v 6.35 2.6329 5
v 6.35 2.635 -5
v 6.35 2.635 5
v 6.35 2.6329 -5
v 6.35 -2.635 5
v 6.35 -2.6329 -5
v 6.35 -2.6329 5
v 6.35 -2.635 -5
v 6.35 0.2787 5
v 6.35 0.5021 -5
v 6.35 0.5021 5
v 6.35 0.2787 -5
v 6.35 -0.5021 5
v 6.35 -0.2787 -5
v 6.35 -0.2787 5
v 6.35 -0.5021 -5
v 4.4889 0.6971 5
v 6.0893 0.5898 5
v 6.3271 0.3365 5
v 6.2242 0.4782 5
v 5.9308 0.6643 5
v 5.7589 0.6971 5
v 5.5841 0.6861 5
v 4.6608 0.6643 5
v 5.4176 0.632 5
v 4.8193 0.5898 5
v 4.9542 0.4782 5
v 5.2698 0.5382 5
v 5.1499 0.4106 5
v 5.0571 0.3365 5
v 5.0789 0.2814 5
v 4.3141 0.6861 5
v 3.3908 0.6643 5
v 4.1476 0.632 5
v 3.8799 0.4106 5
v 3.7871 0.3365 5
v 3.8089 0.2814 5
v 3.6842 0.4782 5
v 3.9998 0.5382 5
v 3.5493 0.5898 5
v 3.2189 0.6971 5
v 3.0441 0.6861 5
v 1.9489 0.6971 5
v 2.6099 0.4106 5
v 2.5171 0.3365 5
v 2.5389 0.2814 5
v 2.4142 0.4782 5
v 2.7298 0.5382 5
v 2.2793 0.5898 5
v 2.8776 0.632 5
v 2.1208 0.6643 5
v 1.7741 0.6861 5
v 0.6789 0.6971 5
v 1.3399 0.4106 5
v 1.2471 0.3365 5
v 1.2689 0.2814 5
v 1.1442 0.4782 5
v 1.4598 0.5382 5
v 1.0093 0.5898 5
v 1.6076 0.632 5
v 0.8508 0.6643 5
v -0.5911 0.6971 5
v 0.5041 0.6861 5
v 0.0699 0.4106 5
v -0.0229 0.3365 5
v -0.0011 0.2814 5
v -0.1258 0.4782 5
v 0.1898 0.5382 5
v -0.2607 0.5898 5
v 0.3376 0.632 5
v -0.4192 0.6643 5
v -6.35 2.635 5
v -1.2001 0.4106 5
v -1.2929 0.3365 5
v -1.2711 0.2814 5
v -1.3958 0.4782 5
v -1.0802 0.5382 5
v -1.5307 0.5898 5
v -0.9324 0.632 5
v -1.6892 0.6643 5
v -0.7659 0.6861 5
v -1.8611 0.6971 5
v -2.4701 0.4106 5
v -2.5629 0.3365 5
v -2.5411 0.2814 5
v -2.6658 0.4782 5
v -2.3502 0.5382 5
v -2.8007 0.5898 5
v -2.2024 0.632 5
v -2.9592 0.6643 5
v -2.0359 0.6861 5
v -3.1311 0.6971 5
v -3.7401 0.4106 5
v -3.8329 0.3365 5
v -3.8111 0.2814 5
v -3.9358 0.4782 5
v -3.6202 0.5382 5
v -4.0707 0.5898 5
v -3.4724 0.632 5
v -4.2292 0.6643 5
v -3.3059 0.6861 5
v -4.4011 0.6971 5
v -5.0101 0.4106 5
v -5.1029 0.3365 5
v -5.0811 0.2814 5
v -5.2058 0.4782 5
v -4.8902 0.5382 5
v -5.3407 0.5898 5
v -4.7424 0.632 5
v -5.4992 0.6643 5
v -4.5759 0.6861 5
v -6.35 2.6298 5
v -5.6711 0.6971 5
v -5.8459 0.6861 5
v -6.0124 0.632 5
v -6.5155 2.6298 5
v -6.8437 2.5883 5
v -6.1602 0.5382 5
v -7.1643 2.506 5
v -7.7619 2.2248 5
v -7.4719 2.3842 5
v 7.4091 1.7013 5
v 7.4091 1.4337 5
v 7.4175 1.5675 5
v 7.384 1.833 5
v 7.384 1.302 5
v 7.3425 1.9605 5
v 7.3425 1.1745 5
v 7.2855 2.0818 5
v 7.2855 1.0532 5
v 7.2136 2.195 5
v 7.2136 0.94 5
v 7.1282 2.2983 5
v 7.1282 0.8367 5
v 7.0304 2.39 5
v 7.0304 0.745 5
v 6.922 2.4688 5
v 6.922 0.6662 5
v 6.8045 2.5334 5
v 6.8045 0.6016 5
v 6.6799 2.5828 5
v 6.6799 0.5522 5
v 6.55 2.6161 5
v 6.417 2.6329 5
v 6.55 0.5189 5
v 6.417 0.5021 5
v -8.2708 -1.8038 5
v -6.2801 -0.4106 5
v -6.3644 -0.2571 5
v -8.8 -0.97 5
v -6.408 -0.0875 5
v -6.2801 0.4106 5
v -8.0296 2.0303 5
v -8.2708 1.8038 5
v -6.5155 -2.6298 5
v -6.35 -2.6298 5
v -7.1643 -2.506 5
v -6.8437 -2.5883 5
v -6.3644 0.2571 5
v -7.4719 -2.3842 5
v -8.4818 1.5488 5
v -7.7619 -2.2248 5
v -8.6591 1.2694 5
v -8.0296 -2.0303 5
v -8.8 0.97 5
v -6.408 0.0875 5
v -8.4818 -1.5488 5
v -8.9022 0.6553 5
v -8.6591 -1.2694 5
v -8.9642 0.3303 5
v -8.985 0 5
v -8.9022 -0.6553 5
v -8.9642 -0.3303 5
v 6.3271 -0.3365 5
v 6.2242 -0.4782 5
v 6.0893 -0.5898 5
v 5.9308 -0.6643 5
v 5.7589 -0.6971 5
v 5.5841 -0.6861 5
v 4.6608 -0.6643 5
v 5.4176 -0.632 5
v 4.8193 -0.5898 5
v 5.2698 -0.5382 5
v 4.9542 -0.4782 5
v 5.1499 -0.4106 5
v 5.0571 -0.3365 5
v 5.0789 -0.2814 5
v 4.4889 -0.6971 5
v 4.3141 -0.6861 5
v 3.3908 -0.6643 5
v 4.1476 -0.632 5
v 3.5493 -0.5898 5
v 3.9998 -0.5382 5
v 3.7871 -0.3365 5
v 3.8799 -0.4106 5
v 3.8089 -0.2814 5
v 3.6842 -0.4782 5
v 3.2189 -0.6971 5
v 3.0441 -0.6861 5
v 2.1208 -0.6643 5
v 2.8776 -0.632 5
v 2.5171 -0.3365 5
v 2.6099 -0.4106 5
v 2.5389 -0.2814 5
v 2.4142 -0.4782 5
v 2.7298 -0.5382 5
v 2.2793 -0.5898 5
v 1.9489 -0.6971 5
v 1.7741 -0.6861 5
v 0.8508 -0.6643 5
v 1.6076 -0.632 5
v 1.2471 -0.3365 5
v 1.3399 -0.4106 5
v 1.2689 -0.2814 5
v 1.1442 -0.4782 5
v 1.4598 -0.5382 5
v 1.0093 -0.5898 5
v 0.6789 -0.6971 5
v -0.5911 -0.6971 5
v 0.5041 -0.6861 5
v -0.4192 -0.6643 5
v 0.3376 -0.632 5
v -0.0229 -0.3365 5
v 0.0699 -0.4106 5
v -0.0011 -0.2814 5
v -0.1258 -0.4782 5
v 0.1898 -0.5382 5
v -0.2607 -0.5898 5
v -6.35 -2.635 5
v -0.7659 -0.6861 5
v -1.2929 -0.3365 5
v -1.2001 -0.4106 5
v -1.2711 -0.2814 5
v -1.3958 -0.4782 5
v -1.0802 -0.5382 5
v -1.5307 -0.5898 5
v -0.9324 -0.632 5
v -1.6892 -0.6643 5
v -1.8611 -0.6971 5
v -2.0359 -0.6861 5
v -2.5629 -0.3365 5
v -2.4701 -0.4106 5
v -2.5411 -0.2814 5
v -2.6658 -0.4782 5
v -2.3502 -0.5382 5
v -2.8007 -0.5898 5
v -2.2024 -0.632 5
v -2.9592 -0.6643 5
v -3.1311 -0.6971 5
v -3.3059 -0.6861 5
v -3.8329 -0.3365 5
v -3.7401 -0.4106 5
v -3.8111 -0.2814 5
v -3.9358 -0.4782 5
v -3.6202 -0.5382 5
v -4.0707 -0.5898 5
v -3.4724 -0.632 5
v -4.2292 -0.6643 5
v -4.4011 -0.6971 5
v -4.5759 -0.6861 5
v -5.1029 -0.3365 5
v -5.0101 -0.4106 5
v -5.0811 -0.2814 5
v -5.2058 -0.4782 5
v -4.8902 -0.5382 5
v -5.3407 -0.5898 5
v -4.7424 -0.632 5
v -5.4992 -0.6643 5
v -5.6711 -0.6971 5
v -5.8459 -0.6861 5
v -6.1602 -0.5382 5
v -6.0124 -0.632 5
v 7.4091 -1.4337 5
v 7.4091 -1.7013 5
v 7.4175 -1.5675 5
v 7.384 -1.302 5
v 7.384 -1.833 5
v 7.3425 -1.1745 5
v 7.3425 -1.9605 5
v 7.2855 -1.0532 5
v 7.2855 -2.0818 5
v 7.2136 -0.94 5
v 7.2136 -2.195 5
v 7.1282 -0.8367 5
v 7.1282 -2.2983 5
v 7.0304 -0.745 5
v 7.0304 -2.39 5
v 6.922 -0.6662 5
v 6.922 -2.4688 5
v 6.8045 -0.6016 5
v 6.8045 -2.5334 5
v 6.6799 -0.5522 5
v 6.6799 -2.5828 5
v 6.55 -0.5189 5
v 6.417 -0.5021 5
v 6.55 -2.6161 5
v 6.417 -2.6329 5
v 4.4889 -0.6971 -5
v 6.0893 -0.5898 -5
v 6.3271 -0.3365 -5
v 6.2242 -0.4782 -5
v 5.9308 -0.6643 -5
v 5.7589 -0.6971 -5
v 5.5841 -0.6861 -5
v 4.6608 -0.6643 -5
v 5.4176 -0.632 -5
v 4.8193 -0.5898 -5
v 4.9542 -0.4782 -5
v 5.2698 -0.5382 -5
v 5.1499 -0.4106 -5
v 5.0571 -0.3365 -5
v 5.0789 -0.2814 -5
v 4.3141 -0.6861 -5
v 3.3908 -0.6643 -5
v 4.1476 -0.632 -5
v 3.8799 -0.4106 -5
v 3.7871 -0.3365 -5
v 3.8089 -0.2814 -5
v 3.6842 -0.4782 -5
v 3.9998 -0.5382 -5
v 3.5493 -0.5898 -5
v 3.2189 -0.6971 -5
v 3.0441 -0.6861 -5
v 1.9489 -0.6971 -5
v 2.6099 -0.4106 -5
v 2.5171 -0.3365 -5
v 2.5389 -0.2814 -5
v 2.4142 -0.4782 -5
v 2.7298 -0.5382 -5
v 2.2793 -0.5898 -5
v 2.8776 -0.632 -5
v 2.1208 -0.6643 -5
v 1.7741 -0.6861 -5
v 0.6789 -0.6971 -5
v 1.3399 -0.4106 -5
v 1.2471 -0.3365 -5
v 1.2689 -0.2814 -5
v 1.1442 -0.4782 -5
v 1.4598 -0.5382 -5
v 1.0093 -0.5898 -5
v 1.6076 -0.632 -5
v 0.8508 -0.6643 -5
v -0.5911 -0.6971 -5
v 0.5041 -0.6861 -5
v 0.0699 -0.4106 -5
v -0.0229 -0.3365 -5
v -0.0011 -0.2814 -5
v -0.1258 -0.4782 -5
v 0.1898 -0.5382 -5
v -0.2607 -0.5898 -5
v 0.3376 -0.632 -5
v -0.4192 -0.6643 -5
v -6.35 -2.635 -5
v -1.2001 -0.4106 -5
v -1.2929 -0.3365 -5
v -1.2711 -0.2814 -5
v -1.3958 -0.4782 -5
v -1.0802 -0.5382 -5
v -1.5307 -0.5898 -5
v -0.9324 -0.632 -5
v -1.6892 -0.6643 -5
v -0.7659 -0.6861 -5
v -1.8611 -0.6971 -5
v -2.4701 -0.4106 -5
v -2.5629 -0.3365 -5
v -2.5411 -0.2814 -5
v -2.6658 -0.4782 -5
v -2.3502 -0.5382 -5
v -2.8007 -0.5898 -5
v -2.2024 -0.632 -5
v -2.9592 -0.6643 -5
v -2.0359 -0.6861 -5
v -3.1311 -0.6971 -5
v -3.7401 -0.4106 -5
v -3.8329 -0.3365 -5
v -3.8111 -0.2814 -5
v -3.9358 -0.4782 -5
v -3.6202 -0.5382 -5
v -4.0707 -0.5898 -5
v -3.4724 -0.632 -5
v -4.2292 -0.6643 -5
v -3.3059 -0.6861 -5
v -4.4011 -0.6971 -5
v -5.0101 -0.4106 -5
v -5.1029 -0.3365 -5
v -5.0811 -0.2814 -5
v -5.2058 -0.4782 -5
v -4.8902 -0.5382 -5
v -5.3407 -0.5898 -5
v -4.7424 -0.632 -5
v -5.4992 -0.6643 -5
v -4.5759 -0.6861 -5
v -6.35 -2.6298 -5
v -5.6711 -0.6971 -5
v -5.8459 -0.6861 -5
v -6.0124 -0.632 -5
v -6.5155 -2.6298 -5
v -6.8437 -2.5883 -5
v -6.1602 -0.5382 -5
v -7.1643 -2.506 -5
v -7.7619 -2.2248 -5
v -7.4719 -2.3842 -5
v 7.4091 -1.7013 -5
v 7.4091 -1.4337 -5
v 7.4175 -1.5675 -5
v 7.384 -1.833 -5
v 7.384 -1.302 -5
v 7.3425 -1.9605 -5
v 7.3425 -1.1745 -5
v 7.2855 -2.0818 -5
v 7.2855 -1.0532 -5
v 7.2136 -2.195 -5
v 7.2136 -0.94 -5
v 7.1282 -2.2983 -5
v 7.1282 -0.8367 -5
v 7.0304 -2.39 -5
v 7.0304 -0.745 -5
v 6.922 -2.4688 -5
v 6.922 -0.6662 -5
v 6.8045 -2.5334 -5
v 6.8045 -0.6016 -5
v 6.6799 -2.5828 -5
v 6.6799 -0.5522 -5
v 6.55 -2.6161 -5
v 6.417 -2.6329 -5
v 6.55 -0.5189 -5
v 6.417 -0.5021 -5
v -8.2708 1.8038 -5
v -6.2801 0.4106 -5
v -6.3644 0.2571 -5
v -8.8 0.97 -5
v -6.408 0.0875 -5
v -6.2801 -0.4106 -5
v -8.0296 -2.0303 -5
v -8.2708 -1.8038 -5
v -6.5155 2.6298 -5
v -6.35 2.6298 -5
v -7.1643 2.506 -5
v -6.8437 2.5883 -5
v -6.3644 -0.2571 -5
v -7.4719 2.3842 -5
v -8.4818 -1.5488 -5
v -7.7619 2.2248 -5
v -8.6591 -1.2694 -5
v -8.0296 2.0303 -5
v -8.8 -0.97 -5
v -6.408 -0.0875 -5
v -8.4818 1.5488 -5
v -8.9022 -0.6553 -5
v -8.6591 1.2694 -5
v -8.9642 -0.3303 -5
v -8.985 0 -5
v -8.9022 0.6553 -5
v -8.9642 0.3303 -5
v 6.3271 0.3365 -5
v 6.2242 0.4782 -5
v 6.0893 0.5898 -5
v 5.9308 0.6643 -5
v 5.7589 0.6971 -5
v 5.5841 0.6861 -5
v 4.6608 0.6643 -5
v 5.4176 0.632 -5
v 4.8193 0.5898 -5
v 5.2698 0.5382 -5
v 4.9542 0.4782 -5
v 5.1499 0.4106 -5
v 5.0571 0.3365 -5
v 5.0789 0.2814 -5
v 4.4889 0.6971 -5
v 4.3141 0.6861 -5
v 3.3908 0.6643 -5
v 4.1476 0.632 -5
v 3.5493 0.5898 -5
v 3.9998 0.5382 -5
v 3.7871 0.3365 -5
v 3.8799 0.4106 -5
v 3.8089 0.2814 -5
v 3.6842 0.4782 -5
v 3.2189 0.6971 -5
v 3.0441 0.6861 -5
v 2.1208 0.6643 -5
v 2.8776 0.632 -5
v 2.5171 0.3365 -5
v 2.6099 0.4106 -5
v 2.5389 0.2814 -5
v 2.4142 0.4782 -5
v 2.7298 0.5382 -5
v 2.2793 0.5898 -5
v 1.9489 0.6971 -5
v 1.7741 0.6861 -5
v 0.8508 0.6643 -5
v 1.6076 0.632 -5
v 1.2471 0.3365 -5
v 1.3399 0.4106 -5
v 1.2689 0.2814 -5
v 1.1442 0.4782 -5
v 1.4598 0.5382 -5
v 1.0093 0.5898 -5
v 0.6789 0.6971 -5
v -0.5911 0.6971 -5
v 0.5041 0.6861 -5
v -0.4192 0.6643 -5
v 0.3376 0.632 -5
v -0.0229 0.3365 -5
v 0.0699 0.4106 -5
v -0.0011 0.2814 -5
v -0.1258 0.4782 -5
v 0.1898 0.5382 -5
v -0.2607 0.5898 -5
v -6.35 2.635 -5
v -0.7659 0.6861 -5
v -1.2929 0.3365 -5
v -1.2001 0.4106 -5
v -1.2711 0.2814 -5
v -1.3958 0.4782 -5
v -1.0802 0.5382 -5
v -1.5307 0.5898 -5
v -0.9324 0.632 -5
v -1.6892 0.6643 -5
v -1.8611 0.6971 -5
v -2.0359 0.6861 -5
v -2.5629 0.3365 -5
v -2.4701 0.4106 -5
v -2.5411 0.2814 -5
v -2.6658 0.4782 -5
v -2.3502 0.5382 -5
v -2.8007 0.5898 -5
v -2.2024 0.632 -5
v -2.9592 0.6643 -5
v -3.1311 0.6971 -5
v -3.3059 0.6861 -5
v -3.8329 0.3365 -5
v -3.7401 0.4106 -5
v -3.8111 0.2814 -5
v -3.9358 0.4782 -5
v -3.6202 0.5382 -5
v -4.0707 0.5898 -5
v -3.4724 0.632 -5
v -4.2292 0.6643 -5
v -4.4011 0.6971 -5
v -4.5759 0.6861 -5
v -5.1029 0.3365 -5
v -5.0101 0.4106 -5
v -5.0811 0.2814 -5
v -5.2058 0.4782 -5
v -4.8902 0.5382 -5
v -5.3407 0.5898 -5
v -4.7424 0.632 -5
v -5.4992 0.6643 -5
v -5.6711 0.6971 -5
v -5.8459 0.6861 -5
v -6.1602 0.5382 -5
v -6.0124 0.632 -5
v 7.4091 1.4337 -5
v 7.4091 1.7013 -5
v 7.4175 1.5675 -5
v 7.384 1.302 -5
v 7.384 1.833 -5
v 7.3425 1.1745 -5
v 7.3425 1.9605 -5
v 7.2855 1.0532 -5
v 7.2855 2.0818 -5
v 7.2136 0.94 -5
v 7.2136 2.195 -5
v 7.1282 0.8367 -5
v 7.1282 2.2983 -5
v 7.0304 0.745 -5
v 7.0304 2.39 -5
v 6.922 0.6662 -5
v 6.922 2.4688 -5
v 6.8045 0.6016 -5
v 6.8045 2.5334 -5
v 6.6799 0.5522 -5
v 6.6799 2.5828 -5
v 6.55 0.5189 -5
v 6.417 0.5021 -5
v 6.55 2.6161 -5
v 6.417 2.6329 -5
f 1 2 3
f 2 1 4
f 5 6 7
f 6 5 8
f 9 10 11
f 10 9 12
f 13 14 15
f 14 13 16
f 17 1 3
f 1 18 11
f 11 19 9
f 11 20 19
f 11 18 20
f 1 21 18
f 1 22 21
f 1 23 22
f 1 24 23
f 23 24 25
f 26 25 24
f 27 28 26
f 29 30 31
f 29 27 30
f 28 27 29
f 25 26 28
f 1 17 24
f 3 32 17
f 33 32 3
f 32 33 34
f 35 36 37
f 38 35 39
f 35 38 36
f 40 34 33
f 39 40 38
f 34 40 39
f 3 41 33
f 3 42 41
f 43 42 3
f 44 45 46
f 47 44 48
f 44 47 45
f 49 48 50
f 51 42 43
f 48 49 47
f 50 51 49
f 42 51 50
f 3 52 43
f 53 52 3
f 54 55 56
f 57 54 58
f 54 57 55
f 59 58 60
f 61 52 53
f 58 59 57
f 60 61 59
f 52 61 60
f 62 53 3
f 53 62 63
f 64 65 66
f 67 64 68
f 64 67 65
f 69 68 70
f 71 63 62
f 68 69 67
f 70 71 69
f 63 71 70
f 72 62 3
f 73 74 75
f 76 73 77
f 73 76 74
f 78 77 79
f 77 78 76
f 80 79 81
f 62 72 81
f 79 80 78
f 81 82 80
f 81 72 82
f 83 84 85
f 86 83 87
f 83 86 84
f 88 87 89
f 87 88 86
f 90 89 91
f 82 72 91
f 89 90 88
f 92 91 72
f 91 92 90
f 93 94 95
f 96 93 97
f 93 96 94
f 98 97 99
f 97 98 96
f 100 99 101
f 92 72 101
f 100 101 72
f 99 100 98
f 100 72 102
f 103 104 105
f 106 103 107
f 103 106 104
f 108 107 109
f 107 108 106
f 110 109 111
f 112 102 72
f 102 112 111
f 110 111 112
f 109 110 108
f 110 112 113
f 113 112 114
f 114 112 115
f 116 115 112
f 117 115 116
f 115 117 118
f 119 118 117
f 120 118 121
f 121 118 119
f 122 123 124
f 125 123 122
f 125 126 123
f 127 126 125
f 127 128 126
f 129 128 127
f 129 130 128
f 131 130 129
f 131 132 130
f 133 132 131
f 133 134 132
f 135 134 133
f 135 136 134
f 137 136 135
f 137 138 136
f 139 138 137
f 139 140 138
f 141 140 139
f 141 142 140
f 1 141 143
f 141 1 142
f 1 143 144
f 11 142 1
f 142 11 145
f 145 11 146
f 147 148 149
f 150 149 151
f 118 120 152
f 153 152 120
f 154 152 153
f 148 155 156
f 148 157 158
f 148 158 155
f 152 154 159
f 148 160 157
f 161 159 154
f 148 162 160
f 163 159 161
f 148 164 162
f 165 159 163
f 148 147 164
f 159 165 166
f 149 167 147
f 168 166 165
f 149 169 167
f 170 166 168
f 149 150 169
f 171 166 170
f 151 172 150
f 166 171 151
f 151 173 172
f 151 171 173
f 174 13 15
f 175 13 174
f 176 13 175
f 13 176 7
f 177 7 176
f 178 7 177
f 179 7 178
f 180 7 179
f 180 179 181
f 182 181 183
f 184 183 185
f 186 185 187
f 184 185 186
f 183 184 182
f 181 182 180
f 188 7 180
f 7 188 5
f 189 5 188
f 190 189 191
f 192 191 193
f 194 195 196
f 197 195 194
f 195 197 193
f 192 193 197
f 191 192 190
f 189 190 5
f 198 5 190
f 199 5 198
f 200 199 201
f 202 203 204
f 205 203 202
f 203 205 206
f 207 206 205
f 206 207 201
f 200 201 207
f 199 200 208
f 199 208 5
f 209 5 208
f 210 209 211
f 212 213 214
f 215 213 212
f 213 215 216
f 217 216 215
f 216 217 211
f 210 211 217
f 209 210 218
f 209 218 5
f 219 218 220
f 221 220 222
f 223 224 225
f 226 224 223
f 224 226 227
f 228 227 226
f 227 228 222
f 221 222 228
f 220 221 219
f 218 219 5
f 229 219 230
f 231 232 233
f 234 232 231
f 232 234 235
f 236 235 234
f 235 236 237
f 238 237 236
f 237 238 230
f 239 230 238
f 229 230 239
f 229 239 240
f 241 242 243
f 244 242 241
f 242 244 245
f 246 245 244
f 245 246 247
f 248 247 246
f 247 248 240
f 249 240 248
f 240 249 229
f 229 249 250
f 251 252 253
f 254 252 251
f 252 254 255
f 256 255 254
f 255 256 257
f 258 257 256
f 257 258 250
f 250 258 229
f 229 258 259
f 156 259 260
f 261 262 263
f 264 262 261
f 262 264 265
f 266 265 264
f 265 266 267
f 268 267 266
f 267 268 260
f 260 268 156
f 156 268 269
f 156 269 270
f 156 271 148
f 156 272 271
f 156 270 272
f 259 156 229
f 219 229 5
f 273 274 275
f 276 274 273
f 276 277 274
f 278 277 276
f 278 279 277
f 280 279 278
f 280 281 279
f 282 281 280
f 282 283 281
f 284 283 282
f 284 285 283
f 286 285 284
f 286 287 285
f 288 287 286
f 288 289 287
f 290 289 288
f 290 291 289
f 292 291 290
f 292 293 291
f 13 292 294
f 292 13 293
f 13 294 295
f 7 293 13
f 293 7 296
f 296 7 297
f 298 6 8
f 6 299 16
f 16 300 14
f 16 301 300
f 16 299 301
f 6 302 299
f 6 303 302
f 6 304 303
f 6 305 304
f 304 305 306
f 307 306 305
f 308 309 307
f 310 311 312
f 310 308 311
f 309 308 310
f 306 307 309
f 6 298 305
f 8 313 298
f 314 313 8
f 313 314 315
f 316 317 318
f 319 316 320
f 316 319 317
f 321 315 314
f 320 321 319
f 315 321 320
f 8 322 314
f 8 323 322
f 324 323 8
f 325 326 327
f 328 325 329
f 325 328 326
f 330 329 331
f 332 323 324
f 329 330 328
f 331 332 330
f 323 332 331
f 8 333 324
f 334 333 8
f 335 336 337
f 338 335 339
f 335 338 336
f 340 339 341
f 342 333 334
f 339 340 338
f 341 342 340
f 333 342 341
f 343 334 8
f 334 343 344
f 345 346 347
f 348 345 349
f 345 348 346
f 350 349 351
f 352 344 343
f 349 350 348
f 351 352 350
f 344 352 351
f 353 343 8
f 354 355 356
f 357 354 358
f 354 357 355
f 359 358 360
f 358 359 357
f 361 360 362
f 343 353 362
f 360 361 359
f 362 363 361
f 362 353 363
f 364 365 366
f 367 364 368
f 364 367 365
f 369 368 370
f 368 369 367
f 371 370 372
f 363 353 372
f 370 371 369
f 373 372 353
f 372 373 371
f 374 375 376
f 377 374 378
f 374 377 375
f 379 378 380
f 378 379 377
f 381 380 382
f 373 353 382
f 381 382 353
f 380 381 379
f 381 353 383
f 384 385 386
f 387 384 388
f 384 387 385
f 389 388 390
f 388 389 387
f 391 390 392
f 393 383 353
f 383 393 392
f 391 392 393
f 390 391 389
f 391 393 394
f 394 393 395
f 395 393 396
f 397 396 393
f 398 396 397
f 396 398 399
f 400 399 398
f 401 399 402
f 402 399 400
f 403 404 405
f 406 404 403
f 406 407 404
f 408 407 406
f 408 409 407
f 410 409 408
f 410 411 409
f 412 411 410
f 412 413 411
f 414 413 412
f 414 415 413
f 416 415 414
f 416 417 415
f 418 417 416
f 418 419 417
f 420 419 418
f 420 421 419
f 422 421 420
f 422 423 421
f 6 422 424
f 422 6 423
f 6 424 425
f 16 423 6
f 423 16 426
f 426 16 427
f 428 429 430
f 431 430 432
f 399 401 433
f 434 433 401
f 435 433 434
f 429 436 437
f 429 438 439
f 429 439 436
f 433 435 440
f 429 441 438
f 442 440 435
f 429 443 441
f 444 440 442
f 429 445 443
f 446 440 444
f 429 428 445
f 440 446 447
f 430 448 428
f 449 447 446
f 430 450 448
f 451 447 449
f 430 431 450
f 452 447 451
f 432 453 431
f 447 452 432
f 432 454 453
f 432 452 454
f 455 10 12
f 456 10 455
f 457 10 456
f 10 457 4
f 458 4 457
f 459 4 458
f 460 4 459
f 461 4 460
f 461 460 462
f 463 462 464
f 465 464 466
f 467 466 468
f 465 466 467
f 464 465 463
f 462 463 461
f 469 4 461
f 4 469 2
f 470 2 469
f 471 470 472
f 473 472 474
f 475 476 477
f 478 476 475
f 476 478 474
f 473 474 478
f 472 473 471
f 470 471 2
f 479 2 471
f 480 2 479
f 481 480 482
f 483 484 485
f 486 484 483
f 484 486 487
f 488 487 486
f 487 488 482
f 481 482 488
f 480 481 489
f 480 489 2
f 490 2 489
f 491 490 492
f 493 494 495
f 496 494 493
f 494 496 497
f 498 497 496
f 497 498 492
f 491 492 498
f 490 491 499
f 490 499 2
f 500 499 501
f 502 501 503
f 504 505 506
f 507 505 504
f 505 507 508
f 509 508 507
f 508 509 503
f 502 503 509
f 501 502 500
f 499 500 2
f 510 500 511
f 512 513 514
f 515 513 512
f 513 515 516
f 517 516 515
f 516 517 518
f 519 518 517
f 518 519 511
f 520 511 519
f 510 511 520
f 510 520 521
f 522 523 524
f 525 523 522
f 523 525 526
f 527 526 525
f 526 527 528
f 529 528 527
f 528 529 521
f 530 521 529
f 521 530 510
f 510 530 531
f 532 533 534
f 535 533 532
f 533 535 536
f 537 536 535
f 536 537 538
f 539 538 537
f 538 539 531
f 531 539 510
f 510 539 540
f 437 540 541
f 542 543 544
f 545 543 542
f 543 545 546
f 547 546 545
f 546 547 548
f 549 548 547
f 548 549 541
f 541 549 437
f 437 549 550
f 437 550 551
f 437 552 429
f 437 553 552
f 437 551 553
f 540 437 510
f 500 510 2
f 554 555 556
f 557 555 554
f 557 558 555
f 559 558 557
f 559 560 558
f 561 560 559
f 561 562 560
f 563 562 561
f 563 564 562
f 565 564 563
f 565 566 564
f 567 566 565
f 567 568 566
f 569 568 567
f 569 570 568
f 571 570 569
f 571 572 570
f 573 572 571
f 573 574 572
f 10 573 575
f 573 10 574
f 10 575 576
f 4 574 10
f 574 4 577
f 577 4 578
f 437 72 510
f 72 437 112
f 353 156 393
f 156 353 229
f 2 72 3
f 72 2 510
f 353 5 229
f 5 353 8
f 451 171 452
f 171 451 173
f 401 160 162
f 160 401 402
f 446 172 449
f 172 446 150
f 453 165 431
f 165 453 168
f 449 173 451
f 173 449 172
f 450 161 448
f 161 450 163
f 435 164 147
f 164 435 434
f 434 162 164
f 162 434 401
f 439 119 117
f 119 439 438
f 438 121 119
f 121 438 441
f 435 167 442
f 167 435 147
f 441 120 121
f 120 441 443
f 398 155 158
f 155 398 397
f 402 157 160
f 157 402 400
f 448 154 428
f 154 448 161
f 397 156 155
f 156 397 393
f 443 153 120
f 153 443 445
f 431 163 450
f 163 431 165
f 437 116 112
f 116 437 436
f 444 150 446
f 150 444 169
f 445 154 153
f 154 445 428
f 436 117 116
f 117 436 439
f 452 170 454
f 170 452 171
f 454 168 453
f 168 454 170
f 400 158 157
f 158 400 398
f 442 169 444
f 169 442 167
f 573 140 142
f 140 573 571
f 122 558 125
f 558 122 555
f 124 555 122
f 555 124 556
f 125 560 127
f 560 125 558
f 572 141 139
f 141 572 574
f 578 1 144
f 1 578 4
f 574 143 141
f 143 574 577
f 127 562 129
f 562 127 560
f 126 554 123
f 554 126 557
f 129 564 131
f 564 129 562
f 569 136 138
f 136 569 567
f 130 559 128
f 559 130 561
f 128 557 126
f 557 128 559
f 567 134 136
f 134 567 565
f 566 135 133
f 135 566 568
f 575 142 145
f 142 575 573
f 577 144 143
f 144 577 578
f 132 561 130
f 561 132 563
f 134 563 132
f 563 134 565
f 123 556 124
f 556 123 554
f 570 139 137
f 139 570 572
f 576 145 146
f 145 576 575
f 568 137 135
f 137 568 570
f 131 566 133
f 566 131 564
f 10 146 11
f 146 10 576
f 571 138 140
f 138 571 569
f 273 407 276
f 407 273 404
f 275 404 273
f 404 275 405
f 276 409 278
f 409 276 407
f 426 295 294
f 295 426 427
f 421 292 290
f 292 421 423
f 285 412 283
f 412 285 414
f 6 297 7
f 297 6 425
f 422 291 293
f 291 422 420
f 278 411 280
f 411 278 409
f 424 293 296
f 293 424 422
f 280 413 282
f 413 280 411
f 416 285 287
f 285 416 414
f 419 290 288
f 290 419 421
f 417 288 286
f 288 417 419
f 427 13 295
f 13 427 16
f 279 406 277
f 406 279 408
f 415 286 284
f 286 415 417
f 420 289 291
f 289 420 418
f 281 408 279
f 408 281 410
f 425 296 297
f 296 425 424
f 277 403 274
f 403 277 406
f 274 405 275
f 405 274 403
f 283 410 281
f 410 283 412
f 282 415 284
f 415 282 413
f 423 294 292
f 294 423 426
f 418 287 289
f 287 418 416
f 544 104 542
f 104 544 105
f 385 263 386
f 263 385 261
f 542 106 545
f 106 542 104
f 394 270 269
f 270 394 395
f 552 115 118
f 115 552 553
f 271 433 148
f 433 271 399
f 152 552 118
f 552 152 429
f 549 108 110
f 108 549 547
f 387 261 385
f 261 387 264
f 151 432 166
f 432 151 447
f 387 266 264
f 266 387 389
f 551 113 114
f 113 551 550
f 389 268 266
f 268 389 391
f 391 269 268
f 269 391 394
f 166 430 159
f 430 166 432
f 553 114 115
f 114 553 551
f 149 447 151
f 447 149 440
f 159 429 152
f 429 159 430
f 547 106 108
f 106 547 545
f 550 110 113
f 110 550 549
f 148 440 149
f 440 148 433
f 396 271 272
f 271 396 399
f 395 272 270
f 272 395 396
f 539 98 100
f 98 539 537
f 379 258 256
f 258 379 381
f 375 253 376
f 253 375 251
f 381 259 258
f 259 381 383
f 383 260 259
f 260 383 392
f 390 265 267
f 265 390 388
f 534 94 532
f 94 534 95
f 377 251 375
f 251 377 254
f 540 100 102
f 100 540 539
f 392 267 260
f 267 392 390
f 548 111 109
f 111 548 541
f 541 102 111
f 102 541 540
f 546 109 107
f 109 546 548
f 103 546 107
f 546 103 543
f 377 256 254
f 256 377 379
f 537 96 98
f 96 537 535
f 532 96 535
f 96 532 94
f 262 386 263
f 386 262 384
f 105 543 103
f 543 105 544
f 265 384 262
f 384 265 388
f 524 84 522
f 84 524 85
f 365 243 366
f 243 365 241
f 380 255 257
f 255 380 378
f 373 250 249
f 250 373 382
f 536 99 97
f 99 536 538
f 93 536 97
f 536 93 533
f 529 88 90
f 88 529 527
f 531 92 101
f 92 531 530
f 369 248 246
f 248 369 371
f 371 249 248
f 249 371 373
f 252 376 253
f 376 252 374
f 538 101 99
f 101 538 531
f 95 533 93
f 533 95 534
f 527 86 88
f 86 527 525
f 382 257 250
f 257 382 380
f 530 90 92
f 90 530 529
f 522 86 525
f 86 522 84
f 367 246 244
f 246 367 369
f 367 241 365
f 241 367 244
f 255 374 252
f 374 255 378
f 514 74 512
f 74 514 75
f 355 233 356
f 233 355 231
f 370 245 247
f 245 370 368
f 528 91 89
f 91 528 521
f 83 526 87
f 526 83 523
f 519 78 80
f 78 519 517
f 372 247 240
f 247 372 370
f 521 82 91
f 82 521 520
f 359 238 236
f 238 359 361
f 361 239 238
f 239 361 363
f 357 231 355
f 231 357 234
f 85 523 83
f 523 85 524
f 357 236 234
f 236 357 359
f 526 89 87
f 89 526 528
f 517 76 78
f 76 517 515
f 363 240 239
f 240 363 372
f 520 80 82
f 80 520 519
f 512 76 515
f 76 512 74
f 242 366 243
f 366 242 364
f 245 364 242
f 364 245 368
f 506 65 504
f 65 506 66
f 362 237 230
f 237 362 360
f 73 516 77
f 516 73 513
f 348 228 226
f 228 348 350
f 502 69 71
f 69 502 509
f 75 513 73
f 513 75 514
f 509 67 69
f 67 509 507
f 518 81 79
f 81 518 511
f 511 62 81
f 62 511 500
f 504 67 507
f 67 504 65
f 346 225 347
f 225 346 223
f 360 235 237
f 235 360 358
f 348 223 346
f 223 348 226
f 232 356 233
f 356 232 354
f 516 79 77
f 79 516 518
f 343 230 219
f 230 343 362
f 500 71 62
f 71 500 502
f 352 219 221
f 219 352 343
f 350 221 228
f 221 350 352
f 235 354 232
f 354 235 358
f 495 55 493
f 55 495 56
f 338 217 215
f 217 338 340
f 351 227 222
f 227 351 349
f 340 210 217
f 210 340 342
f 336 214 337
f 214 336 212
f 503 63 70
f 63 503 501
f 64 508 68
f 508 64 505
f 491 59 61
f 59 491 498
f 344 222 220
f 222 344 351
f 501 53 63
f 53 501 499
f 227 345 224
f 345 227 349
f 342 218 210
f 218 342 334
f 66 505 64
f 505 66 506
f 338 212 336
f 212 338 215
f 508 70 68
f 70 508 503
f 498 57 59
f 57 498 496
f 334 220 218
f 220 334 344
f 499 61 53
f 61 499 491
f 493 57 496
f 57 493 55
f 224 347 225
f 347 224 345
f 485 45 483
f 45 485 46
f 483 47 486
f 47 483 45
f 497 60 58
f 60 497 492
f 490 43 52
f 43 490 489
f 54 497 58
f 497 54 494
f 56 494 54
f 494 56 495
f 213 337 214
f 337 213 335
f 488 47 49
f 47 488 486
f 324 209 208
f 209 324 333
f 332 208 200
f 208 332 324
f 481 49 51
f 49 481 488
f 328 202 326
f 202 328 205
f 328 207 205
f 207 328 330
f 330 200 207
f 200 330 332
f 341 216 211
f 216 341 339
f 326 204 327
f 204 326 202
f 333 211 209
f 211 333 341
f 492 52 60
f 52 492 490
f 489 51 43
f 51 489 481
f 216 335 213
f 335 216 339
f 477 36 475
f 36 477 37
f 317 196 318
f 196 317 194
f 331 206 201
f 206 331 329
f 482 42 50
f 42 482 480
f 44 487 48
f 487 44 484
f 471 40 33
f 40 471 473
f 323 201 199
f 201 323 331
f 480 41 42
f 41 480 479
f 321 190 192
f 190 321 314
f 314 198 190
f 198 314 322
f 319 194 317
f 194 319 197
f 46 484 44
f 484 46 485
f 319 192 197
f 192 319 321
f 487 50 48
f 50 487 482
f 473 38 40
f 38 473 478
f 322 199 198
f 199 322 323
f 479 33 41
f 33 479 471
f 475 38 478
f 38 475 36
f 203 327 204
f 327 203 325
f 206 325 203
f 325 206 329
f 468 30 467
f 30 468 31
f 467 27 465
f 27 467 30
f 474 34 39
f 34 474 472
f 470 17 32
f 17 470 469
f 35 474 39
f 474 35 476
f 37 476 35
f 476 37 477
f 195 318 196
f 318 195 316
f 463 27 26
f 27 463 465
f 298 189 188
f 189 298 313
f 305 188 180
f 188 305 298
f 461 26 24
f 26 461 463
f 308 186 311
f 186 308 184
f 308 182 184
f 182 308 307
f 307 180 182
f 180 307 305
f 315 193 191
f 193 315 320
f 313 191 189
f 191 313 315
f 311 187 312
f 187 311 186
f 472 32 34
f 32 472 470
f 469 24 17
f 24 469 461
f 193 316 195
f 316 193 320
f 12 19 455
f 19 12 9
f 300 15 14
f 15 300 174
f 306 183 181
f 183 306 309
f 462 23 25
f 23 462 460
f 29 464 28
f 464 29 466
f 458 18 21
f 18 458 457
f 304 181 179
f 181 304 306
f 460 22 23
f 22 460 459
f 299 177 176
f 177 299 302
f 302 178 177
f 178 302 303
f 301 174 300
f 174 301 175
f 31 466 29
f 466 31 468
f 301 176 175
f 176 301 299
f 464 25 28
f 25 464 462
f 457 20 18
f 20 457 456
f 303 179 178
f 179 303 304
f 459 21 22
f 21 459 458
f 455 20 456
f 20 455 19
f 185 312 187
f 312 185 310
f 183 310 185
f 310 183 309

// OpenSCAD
//CUSTOMIZER VARIABLES

// Number of wires of the ribbon cable
wire_count = 10; //  [0:100]

// Width of the ribbon cable
wire_width = 12.7; //  [0:200]

// Depth of the clip
clip_depth = 10; //  [0:30]

//CUSTOMIZER VARIABLES END


module ribbonCableClip(wireCount, cableWidth, depth)
{
  wireDiameter = cableWidth / wireCount;
  
  difference()
  {
    union()
    {
      cube([cableWidth, wireDiameter+4, depth], center=true);
      translate([(-cableWidth)/2,0,0]) cylinder(d=wireDiameter+4, h=depth, center=true, $fn=50);
      translate([(cableWidth)/2,(wireDiameter+5)/4,0]) cylinder(d=(wireDiameter+3)/2, h=depth, center=true, $fn=50);
      
      translate([(cableWidth)/2,-(wireDiameter+5)/4,0]) cylinder(d=(wireDiameter+3)/2, h=depth, center=true, $fn=50);
    }
    for(i=[0:1:wireCount-1])
    {
      translate([(wireDiameter-cableWidth)/2+i*wireDiameter,0,0]) cylinder(d=wireDiameter*1.1, h=depth+2, center=true, $fn=25);
    }
  }
}

// Ribbon cable with 18 wires a width of 22.7mm
//ribbonCableClip(18, 22.7, 10);



ribbonCableClip(wire_count, wire_width, clip_depth);
